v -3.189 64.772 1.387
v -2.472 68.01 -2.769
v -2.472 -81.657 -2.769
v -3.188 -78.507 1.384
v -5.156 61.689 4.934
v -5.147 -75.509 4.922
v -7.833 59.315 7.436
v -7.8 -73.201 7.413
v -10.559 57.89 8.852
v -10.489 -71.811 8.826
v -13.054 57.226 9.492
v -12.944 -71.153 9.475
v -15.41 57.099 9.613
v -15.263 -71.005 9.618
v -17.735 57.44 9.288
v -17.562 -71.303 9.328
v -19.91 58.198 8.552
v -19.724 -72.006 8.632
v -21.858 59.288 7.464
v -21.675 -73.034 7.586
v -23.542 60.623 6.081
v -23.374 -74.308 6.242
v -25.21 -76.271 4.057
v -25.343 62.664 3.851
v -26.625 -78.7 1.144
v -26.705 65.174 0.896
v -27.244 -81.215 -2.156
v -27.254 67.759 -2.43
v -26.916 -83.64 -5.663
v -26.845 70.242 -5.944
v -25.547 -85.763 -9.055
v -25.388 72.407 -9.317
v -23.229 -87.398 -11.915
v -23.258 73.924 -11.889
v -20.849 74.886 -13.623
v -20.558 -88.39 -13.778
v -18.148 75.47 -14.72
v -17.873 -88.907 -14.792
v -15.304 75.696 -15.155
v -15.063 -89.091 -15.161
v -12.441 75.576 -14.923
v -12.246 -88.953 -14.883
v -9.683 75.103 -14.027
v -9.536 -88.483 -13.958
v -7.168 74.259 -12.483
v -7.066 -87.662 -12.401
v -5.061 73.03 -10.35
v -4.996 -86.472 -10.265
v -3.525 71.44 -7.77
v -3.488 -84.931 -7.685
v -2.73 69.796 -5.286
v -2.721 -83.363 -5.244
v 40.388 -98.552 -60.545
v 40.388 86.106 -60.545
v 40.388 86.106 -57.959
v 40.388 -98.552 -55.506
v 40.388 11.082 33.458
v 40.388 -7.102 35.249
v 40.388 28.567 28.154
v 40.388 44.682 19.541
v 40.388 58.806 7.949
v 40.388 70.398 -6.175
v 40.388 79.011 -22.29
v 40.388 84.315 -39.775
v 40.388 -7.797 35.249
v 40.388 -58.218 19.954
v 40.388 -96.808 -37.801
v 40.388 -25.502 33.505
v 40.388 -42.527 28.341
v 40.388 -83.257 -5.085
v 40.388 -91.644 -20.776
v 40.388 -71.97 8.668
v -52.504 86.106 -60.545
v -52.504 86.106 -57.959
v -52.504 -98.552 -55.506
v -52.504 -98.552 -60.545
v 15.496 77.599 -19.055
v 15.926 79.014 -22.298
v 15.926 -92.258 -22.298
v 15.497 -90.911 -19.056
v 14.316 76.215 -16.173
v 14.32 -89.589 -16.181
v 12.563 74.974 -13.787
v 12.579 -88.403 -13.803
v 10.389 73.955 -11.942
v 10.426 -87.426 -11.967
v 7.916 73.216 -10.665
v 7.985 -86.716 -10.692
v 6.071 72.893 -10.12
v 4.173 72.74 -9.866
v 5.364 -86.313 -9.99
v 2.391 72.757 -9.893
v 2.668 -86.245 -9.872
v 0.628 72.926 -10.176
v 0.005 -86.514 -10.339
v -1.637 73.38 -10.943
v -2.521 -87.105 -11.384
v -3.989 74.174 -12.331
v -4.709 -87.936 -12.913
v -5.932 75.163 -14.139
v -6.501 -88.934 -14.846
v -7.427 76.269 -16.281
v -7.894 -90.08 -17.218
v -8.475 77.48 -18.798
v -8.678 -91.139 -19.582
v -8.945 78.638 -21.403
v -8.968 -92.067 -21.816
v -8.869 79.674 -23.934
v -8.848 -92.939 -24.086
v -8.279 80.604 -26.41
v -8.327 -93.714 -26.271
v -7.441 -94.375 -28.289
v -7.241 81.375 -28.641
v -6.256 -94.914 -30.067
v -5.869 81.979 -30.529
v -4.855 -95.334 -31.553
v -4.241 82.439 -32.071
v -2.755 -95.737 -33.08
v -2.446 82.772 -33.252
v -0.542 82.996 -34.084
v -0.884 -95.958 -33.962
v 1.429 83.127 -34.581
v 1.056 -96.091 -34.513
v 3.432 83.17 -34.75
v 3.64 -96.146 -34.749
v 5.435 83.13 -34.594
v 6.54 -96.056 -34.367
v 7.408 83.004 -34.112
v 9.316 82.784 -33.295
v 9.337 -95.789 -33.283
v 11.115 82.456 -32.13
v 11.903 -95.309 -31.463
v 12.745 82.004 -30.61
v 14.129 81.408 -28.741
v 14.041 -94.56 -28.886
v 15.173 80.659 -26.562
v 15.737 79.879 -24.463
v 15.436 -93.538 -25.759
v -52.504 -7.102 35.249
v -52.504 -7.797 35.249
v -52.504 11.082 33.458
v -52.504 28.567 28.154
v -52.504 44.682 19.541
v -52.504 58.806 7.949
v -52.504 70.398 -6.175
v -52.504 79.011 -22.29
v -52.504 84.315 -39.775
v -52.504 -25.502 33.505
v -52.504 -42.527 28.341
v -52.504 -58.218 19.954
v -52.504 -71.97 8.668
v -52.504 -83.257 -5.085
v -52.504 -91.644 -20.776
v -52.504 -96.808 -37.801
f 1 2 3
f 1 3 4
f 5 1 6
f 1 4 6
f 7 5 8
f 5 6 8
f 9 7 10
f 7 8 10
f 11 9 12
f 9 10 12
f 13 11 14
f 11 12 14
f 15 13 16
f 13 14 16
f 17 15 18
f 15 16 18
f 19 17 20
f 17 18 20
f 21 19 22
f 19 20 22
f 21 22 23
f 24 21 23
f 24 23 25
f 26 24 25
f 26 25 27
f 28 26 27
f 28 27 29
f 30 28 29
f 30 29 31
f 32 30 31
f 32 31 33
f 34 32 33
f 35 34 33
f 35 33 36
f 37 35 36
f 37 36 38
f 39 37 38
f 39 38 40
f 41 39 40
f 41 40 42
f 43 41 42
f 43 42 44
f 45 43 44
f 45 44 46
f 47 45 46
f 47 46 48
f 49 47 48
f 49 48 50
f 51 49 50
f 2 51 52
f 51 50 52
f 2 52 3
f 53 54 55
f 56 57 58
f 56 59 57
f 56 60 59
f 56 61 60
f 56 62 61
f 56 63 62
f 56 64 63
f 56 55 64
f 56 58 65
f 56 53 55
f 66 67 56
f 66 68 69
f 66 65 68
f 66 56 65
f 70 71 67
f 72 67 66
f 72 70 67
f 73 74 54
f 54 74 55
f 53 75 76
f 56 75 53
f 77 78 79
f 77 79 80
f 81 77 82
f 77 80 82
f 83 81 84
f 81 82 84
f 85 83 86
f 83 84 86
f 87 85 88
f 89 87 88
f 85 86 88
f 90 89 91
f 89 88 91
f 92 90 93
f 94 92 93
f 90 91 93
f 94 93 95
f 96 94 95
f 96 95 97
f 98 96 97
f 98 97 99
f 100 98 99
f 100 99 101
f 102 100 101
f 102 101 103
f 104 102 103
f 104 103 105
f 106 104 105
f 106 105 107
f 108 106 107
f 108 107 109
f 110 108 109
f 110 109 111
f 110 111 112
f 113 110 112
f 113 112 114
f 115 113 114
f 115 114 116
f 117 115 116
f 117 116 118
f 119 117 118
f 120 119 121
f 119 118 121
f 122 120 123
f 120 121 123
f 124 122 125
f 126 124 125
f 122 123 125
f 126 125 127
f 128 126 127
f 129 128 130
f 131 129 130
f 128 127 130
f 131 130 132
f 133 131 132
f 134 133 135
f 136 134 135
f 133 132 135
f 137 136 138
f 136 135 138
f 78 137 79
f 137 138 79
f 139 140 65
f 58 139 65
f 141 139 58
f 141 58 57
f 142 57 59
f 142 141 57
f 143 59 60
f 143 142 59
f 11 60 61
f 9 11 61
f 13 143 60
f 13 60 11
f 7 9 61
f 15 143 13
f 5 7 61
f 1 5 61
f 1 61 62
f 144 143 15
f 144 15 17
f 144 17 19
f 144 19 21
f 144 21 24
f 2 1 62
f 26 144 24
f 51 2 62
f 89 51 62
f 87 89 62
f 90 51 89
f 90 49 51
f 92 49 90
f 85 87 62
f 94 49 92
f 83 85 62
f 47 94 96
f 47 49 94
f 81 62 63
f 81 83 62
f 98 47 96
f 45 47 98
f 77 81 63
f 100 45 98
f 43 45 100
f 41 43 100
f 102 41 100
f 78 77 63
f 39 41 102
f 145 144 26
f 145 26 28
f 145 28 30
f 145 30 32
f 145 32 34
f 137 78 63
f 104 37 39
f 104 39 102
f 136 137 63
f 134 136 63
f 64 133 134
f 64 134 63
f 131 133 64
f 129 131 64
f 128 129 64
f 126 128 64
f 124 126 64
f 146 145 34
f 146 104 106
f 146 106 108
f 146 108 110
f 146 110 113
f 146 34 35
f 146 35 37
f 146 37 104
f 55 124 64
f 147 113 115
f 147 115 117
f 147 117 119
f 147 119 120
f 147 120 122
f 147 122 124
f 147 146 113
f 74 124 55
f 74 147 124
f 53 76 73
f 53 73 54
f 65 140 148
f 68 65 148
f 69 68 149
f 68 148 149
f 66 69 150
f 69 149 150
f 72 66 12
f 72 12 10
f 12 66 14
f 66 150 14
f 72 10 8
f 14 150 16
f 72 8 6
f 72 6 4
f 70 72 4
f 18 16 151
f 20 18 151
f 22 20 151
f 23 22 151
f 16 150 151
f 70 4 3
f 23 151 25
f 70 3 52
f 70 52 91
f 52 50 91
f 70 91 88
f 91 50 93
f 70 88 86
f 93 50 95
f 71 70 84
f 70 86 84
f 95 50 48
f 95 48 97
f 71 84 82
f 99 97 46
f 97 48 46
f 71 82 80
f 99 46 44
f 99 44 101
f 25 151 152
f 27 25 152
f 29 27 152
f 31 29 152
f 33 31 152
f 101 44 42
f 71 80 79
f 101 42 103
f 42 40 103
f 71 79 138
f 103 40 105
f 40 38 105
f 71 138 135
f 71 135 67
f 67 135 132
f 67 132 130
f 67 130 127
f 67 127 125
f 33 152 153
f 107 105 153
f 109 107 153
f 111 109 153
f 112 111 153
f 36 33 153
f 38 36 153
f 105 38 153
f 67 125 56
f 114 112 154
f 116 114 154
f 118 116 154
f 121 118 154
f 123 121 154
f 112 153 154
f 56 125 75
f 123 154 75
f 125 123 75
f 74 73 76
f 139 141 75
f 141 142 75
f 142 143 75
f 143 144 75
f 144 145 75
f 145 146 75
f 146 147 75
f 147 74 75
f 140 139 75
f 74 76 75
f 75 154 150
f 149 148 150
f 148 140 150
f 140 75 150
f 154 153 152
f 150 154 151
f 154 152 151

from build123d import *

# Parameters (mm, degrees)
F0_W        = 92.8924418986
F0_H        = 95.79378739
F1_DEPTH    = 98.552
F2_DEPTH    = 86.106
F3_R        = 12.3937050542
F4_DEPTH    = 203.2
F5_R        = 12.4518339151
F6_DEPTH    = 203.2
F7_T1_DEPTH = 546.6680230822
F8_T1_DEPTH = 558.9322279791


# Not quite as in the source:
# - a fillet or chamfer that OpenCascade refuses, or shapes differently, is made with other operations: its cross-section is extruded or revolved along the edge and cut away or added


with BuildPart() as f1:
    # F0 (on Front) → F1 (new body)
    with BuildSketch(Plane.XZ):
        with Locations((-6.0582030565, -12.6477908343)):
            Rectangle(F0_W, F0_H)
    extrude(amount=F1_DEPTH)

    # F2 (add): a face of the model
    f2_faces = [f1.faces().sort_by_distance(p)[0] for p in [
        (-6.0582030565, 0, -12.6477908343),
    ]]
    extrude(f2_faces, amount=F2_DEPTH)

    # F3 (on face) → F4 (cut)
    with BuildSketch(Plane.XZ.offset(98.552)):
        with Locations((-14.8652456701, -2.7690164279)):
            Circle(F3_R)
    extrude(amount=-F4_DEPTH, mode=Mode.SUBTRACT)

    # F5 (on face) → F6 (cut)
    with BuildSketch(Plane.XZ.offset(98.552)):
        with Locations((3.47437663, -22.2978685051)):
            Circle(F5_R)
    extrude(amount=-F6_DEPTH, mode=Mode.SUBTRACT)

    # F7: fillet of radius 90.7551162367 on 1 edges, made by hand

    # F7_s2 → F7_t1 (cut)
    with BuildSketch(Plane.YZ.offset(-279.3922145976)):
        with BuildLine():
            ThreePointArc((-7.7968837633, 35.2491028607), (-71.9704418816, 8.6675447423), (-98.552, -55.506013376))
            Line((-98.552, -55.506013376), (-98.552, 35.2491028607))
            Line((-98.552, 35.2491028607), (-7.7968837633, 35.2491028607))
        make_face()
    extrude(amount=F7_T1_DEPTH, mode=Mode.SUBTRACT)

    # F8: fillet of radius 93.2079572161 on 1 edges, made by hand

    # F8_s2 → F8_t1 (cut)
    with BuildSketch(Plane.YZ.offset(-285.524317046)):
        with BuildLine():
            ThreePointArc((-7.1019572161, 35.2491028607), (58.8060213919, 7.9491242526), (86.106, -57.9588543554))
            Line((86.106, -57.9588543554), (86.106, 35.2491028607))
            Line((86.106, 35.2491028607), (-7.1019572161, 35.2491028607))
        make_face()
    extrude(amount=F8_T1_DEPTH, mode=Mode.SUBTRACT)


solid = f1.part
